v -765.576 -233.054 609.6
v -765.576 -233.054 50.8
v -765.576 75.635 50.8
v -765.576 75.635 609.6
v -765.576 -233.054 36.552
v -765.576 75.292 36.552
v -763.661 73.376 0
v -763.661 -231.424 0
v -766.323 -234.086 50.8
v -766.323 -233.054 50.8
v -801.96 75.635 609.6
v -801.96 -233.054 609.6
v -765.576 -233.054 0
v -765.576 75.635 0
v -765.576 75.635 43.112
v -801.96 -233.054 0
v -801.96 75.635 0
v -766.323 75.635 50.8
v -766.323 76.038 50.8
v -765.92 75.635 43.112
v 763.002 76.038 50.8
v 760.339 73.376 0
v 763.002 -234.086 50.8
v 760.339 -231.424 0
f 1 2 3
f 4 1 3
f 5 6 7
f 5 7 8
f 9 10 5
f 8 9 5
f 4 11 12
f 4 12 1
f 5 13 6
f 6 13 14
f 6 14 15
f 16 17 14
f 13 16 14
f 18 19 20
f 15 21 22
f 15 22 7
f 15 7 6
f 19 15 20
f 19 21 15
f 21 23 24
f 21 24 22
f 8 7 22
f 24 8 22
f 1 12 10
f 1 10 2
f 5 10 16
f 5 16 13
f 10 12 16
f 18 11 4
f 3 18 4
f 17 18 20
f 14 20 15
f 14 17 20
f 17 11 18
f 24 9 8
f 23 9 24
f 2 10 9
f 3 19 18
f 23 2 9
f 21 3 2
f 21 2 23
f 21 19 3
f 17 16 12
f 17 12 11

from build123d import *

# Parameters (mm, degrees)
F0_W      = 1524
F0_H      = 304.8
F1_DEPTH  = 25.4
F1_TAPER  = -3
F1_FACE_W = 1526.6623151876
F1_FACE_H = 307.4623151876
F3_DEPTH  = 25.4
F3_TAPER  = -3
F4_W      = 36.3832712173
F4_H      = 308.6890354753
F5_DEPTH  = 609.6


# Not quite as in the source:
# - a feature names something its author has since deleted; it is built from what else it names


with BuildPart() as f1:
    # F0 (on Top) → F1 (new body)
    with BuildSketch(Plane.XY):
        with Locations((-1.6607679427, -79.0239475151)):
            Rectangle(F0_W, F0_H)
    extrude(amount=F1_DEPTH, taper=F1_TAPER)

    # F1_face (on face) → F3 (join)
    with BuildSketch(Plane(origin=(-1.6607679427, -79.0239475151, 25.4), x_dir=(1, 0, 0), z_dir=(0, 0, 1))):
        Rectangle(F1_FACE_W, F1_FACE_H)
    extrude(amount=F3_DEPTH, taper=F3_TAPER)

    # F4 (on Top) → F5 (join)
    with BuildSketch(Plane.XY):
        with Locations((-783.7679982185, -78.7090621889)):
            Rectangle(F4_W, F4_H)
    extrude(amount=F5_DEPTH)


solid = f1.part
